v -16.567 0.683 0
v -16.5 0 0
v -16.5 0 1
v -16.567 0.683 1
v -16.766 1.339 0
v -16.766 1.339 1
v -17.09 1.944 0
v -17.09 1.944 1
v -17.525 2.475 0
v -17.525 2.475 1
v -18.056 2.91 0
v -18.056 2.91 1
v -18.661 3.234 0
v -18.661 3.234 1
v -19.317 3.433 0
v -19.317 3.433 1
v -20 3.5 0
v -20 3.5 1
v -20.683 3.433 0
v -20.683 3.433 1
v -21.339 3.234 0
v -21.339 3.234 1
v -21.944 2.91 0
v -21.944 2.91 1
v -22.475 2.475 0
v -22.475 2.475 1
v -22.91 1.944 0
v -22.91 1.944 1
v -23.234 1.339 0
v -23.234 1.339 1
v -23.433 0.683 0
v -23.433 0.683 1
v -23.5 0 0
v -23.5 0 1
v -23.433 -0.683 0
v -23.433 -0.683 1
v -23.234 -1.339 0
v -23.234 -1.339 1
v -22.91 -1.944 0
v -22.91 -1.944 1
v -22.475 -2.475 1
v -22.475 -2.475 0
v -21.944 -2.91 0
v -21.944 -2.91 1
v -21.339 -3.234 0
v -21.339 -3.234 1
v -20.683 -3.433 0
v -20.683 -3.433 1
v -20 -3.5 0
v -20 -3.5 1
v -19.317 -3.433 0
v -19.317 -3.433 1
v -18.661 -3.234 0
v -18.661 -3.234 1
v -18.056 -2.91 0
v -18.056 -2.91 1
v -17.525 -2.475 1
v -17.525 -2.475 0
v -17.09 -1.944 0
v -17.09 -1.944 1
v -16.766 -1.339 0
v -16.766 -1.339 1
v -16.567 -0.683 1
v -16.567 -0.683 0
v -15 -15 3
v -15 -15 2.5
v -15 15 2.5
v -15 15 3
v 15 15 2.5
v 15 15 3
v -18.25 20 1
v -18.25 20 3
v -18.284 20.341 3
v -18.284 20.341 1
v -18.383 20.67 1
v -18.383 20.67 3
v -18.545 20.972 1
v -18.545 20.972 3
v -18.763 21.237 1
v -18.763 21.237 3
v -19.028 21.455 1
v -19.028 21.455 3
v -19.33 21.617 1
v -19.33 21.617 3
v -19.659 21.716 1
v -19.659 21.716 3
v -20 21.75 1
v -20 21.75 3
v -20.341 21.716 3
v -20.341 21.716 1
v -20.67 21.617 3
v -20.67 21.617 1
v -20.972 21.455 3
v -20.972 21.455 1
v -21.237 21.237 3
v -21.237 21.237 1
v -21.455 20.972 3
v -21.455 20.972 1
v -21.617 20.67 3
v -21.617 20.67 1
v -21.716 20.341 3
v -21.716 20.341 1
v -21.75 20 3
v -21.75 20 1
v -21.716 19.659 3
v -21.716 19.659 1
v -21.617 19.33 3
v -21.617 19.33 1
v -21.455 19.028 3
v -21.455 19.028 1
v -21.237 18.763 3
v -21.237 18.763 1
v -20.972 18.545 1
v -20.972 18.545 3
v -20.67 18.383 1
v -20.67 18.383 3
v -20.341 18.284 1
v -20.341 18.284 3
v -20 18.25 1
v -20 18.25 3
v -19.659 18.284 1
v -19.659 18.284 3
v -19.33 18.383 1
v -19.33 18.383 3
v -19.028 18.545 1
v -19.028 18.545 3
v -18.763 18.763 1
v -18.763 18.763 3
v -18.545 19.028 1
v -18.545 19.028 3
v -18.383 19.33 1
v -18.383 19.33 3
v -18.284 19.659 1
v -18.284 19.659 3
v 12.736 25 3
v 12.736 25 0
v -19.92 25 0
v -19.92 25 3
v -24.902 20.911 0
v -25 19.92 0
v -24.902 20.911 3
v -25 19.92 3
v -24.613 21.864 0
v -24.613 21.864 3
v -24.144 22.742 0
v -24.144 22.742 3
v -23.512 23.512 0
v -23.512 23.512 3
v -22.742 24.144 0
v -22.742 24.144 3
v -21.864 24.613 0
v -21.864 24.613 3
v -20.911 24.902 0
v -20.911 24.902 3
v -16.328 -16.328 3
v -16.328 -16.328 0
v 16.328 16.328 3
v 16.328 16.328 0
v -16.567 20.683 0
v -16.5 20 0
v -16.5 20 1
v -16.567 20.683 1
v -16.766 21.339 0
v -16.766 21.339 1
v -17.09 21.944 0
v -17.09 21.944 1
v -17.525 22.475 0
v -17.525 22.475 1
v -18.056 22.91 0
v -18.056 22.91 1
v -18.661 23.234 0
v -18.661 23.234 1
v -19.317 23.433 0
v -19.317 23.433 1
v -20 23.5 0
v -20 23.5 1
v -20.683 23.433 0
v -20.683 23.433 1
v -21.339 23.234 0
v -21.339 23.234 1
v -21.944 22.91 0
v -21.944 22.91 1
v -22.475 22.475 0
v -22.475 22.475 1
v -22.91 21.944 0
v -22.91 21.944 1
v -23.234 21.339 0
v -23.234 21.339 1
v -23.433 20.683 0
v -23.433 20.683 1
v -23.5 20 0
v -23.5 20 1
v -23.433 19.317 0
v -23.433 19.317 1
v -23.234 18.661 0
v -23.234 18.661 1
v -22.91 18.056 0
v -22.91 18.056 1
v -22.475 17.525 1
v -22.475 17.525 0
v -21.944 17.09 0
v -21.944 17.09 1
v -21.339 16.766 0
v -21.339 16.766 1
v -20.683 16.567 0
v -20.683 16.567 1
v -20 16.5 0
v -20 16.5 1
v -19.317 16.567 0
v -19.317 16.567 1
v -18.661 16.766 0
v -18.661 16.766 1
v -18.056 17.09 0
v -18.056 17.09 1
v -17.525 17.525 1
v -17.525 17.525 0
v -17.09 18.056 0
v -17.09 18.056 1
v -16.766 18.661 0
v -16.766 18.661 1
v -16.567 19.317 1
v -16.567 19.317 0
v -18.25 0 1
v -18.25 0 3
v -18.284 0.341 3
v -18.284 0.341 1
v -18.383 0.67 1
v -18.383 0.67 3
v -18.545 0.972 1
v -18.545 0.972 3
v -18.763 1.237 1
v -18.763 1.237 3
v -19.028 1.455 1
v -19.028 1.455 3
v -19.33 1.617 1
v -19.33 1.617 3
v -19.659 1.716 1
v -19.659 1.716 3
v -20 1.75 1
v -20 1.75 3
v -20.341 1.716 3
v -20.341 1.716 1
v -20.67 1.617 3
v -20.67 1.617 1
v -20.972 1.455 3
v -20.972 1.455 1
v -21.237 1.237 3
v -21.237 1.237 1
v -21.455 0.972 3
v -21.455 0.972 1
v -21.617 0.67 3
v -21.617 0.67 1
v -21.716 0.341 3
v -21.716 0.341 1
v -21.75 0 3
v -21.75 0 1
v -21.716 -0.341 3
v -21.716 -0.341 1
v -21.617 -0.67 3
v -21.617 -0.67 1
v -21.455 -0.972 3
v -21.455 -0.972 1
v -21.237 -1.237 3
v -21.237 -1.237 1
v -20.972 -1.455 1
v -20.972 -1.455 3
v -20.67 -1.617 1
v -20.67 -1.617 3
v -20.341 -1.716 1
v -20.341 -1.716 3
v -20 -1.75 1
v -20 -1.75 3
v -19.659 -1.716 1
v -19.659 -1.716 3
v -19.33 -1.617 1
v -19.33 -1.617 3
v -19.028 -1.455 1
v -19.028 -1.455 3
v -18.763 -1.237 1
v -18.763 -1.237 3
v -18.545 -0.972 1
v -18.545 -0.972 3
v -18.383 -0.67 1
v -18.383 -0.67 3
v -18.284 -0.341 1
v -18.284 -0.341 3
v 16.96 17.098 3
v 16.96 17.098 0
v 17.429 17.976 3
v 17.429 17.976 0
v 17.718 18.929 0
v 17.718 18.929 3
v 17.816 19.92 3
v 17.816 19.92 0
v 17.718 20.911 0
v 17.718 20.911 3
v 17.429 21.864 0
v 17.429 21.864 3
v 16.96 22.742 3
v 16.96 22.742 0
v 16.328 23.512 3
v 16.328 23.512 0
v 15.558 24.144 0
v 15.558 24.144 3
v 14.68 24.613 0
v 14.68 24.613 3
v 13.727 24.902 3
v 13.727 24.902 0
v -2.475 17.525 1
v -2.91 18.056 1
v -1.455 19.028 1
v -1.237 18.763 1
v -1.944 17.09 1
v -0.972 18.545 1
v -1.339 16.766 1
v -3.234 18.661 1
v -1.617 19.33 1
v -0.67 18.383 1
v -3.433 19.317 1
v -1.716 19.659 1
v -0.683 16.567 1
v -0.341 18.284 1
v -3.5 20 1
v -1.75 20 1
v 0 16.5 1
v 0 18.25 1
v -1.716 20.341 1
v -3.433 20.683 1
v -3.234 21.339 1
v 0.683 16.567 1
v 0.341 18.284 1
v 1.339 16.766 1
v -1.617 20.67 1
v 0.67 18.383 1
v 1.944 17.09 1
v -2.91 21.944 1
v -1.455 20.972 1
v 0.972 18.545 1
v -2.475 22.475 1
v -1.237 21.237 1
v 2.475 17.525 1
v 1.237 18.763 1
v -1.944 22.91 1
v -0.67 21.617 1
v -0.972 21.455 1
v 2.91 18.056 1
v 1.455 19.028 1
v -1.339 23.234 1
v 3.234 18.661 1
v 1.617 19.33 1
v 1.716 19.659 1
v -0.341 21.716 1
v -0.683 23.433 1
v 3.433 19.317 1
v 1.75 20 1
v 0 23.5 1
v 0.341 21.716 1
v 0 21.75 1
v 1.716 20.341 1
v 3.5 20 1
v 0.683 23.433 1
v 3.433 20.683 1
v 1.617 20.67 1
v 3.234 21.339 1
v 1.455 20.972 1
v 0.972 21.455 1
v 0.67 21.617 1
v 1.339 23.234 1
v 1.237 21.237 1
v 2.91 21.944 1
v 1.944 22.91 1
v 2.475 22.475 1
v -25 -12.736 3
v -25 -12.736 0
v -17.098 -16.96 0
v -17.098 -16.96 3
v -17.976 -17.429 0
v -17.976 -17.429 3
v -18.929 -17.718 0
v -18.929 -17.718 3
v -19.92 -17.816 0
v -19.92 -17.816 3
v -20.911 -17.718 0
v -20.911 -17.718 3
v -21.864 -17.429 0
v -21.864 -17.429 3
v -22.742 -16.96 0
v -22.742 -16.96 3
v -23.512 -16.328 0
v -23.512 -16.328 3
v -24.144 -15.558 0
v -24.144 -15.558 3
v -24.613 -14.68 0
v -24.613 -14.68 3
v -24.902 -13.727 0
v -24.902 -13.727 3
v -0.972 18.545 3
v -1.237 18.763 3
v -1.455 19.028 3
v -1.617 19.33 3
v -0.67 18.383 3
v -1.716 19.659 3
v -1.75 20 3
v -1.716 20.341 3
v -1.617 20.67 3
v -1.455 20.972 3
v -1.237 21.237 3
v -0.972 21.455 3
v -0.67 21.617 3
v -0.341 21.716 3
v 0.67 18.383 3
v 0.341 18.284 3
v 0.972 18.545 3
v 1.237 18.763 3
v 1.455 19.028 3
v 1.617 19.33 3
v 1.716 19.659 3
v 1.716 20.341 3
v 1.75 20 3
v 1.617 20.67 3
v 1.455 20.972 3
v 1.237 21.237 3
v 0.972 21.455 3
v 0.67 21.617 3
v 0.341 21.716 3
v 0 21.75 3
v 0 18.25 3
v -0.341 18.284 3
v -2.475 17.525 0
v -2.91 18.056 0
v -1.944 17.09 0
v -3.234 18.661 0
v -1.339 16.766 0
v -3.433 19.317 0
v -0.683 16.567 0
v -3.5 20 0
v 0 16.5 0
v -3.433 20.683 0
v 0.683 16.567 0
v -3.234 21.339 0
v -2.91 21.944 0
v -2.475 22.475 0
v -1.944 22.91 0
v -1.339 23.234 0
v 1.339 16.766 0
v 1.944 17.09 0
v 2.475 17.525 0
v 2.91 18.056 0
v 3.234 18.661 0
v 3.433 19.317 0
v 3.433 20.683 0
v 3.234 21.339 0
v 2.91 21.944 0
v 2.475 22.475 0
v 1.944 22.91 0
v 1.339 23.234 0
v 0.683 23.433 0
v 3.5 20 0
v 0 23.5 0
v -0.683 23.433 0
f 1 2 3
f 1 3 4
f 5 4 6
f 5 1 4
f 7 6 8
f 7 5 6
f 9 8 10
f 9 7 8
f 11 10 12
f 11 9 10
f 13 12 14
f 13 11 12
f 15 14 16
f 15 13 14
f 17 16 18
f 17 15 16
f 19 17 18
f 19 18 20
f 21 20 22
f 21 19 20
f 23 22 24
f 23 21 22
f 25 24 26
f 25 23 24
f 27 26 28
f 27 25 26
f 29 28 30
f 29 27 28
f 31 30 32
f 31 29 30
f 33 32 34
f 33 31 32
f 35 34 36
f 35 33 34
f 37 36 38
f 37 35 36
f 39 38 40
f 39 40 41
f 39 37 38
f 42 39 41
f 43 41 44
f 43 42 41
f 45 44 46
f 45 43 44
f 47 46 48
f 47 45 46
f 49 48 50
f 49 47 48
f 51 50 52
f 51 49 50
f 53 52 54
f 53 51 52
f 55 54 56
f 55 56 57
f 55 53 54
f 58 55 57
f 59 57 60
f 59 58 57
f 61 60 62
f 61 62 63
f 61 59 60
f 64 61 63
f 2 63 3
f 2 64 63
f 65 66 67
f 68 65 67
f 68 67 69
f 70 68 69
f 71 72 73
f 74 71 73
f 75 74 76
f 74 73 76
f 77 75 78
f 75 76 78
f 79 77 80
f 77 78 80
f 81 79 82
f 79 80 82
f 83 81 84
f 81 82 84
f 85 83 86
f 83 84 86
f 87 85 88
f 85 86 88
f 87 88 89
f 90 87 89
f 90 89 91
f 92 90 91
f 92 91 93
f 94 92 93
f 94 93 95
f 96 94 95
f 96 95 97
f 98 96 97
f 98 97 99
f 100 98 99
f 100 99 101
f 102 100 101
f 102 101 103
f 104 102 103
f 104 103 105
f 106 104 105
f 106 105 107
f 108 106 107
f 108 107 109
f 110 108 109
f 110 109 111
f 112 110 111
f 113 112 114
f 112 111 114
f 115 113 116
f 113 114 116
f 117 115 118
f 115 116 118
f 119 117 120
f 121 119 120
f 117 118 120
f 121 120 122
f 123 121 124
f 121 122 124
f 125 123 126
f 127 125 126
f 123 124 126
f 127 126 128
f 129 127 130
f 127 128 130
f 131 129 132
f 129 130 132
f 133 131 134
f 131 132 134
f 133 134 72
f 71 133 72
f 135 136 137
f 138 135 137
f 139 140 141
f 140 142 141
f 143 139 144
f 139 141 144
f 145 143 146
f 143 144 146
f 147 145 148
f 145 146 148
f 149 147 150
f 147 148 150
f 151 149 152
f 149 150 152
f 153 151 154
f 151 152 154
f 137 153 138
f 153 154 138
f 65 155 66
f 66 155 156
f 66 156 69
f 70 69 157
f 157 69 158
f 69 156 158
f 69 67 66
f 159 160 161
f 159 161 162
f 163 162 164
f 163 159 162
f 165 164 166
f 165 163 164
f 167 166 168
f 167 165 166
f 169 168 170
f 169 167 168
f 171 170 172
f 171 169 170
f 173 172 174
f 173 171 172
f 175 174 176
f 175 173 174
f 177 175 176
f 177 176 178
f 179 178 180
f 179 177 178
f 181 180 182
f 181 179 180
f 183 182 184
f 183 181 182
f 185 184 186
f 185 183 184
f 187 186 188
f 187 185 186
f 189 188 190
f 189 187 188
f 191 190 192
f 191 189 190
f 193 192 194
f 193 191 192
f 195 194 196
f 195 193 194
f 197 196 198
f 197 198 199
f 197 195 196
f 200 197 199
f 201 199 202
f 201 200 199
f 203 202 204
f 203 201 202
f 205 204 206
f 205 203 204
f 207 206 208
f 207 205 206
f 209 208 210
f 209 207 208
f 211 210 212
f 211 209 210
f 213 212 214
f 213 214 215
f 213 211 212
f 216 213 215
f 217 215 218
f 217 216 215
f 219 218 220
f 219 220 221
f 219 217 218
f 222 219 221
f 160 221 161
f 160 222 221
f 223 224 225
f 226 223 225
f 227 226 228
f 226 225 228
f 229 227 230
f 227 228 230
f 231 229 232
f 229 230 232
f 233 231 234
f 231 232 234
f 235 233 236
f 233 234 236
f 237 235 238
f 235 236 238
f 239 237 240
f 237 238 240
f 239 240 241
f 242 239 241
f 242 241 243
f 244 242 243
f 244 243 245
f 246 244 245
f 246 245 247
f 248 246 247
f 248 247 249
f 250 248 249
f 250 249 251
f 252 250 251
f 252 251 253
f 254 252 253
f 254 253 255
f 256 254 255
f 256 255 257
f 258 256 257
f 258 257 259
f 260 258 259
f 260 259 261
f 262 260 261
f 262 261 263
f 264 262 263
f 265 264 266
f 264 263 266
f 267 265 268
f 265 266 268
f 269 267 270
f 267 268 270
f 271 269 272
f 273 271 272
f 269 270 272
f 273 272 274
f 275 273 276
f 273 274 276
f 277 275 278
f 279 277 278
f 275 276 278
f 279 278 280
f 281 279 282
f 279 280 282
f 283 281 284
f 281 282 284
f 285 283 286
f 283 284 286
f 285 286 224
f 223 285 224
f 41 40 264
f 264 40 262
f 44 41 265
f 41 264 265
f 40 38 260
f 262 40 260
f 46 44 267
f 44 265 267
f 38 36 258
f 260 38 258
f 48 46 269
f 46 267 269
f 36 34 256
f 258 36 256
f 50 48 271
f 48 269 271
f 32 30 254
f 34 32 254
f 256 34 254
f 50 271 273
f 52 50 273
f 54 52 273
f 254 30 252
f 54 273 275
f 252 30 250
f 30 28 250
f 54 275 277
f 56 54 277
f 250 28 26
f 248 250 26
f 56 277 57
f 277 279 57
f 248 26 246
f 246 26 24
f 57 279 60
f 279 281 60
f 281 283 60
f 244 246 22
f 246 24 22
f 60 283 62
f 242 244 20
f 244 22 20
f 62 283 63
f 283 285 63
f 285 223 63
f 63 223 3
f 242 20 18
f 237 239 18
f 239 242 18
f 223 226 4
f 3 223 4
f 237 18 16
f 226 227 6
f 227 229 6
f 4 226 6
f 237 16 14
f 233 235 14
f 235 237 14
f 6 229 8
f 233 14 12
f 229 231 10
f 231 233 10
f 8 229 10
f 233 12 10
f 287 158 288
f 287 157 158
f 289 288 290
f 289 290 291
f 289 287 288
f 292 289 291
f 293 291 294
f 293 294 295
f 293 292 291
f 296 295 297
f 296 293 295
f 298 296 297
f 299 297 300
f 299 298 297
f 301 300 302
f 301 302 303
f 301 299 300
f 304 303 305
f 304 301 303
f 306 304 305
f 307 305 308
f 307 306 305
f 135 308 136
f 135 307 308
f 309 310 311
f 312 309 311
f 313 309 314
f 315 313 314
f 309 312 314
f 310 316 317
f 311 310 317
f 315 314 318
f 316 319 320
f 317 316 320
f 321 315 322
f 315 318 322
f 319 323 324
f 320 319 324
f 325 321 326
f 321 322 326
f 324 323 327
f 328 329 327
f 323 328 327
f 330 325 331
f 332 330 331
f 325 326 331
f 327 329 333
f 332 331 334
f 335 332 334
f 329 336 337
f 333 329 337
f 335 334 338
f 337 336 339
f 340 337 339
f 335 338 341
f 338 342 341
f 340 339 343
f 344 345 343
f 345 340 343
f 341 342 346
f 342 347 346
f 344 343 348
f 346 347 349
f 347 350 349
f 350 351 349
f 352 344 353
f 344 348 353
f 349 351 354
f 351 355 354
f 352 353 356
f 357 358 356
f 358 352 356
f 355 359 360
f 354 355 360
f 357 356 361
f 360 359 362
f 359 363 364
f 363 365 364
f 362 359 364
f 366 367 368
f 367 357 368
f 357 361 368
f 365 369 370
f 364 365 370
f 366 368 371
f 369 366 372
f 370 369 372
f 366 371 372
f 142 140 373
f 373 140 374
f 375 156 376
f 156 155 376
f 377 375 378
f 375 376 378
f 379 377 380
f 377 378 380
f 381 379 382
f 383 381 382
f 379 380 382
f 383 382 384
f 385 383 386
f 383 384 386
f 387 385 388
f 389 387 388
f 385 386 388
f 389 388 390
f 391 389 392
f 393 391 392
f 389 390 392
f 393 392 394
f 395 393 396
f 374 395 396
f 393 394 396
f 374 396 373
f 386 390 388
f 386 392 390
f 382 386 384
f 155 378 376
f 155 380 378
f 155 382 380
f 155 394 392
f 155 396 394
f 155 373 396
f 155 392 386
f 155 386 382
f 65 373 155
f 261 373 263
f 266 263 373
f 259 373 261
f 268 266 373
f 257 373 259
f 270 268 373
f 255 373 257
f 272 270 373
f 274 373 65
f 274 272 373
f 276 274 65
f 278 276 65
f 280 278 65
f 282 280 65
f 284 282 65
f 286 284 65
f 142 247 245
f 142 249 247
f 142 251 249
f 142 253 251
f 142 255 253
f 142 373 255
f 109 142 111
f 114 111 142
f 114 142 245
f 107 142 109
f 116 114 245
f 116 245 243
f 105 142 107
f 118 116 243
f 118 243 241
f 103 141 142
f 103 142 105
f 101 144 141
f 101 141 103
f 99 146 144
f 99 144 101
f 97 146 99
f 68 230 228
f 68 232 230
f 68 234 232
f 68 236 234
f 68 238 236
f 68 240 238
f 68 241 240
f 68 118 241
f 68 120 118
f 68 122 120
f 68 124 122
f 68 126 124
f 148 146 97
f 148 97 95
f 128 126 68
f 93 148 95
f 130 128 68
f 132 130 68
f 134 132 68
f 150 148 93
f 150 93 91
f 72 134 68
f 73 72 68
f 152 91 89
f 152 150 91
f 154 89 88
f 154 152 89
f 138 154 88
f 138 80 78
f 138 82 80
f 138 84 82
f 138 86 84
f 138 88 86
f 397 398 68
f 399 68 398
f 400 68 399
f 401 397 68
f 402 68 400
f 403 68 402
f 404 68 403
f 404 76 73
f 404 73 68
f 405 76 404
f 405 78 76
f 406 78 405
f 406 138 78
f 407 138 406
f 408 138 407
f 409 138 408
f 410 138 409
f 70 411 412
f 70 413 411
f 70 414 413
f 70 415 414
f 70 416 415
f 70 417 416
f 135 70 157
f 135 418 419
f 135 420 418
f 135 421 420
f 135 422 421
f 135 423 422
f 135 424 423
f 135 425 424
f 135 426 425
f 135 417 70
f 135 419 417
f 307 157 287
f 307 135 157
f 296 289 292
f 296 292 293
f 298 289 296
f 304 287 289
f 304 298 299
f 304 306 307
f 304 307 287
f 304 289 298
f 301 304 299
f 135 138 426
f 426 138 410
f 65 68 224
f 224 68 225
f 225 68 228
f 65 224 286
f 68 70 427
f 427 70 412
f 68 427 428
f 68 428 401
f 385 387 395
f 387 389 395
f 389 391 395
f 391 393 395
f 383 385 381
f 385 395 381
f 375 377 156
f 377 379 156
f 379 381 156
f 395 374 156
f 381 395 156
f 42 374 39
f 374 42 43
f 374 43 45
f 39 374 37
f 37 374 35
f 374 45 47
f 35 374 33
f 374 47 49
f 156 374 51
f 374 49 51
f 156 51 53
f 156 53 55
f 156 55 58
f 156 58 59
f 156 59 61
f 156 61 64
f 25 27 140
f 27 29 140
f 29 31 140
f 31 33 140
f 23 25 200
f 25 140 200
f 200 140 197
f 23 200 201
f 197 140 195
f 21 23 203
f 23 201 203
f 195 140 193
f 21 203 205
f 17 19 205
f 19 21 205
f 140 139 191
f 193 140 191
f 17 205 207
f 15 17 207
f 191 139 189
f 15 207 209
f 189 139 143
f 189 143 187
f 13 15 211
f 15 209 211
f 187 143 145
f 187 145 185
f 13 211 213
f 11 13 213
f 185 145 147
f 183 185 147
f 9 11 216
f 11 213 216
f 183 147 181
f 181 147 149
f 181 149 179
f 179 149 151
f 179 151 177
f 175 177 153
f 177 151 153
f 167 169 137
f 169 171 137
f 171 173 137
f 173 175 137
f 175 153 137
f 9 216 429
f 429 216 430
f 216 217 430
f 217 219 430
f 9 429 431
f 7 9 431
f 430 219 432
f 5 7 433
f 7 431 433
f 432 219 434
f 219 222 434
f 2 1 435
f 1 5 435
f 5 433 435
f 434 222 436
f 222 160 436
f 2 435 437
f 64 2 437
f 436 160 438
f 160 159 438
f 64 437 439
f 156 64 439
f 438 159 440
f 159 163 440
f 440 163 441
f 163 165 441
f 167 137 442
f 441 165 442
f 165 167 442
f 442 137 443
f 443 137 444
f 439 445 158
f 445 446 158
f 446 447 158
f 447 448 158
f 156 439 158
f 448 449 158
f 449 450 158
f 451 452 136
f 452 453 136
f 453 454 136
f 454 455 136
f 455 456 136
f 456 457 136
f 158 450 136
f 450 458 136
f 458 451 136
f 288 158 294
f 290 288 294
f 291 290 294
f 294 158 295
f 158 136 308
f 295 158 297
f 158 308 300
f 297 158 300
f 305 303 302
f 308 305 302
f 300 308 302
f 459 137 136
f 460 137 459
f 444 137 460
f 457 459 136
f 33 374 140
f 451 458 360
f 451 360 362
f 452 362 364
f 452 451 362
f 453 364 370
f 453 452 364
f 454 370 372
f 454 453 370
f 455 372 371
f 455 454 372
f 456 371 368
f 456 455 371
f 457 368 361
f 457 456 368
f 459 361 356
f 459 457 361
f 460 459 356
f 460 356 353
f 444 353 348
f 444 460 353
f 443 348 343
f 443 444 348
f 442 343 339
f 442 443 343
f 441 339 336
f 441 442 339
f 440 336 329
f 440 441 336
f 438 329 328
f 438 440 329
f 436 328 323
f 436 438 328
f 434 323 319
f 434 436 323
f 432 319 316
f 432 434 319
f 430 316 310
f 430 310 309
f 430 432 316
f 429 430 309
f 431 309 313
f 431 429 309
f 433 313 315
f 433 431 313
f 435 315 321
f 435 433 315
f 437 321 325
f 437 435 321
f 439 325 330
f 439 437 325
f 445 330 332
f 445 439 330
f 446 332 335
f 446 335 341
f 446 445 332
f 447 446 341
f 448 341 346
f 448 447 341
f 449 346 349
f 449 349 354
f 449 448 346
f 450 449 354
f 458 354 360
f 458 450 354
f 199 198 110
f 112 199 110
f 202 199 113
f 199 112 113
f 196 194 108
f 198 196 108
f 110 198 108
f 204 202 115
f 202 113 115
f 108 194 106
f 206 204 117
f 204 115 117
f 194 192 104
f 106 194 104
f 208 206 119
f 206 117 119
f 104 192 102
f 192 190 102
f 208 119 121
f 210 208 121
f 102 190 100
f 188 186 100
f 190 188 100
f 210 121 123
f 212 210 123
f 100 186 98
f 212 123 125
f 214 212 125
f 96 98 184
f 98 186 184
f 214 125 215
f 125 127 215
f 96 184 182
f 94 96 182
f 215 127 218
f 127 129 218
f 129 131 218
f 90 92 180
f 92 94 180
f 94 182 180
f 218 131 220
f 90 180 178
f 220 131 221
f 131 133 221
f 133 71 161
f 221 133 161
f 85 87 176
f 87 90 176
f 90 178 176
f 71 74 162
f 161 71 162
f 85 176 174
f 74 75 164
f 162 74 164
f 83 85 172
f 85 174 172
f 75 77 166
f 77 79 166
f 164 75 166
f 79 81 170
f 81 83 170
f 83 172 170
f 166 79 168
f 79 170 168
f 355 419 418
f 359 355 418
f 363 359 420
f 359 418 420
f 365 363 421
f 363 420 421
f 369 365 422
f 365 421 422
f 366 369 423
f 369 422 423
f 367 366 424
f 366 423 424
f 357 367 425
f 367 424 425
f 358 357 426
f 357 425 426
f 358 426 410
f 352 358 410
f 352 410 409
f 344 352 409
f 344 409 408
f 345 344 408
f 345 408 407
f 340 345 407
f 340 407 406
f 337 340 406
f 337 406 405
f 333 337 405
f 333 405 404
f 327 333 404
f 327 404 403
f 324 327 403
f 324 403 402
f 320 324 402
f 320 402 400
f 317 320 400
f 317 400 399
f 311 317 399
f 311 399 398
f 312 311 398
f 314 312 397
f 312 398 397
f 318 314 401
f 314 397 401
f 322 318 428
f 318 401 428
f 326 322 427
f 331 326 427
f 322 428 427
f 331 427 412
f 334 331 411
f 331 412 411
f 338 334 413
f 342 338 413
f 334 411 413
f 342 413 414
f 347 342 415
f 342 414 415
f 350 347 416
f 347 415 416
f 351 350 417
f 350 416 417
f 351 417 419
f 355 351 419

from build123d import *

# Parameters (mm, degrees)
F1_DEPTH = 3
F2_DEPTH = 2.5
F3_R     = 1.75
F4_DEPTH = 3.001
F5_R     = 3.5
F6_DEPTH = 1
F7_R     = 5.08


with BuildPart() as f1:
    # F0 (on Top) → F1 (new body)
    with BuildSketch(Plane.XY):
        Polygon((15, 15), (25, 25), (-25, 25), (-25, -25), (-15, -15), (-15, 15), align=None)
    extrude(amount=F1_DEPTH)

    # F0 (on Top) → F2 (join)
    with BuildSketch(Plane.XY):
        Polygon((-15, -15), (15, 15), (-15, 15), align=None)
    extrude(amount=F2_DEPTH)

    # F3 (on face) → F4 (cut, through all)
    with BuildSketch(Plane.XY.offset(3)):
        with Locations((-20, 20)):
            Circle(F3_R)
        with Locations((0, 20)):
            Circle(F3_R)
        with Locations((-20, 0)):
            Circle(F3_R)
    extrude(amount=-F4_DEPTH, mode=Mode.SUBTRACT)

    # F5 (on face) → F6 (cut)
    with BuildSketch(Plane.XY):
        with Locations((-20, 0)):
            Circle(F5_R)
        with Locations((-20, 20)):
            Circle(F5_R)
        with Locations((0, 20)):
            Circle(F5_R)
    extrude(amount=F6_DEPTH, mode=Mode.SUBTRACT)

    # F7
    f7_edges = [f1.edges().sort_by_distance(p)[0] for p in [
        (25, 25, 1.5),
        (-25, -25, 1.5),
        (-25, 25, 1.5),
    ]]
    fillet(f7_edges, radius=F7_R)


solid = f1.part
